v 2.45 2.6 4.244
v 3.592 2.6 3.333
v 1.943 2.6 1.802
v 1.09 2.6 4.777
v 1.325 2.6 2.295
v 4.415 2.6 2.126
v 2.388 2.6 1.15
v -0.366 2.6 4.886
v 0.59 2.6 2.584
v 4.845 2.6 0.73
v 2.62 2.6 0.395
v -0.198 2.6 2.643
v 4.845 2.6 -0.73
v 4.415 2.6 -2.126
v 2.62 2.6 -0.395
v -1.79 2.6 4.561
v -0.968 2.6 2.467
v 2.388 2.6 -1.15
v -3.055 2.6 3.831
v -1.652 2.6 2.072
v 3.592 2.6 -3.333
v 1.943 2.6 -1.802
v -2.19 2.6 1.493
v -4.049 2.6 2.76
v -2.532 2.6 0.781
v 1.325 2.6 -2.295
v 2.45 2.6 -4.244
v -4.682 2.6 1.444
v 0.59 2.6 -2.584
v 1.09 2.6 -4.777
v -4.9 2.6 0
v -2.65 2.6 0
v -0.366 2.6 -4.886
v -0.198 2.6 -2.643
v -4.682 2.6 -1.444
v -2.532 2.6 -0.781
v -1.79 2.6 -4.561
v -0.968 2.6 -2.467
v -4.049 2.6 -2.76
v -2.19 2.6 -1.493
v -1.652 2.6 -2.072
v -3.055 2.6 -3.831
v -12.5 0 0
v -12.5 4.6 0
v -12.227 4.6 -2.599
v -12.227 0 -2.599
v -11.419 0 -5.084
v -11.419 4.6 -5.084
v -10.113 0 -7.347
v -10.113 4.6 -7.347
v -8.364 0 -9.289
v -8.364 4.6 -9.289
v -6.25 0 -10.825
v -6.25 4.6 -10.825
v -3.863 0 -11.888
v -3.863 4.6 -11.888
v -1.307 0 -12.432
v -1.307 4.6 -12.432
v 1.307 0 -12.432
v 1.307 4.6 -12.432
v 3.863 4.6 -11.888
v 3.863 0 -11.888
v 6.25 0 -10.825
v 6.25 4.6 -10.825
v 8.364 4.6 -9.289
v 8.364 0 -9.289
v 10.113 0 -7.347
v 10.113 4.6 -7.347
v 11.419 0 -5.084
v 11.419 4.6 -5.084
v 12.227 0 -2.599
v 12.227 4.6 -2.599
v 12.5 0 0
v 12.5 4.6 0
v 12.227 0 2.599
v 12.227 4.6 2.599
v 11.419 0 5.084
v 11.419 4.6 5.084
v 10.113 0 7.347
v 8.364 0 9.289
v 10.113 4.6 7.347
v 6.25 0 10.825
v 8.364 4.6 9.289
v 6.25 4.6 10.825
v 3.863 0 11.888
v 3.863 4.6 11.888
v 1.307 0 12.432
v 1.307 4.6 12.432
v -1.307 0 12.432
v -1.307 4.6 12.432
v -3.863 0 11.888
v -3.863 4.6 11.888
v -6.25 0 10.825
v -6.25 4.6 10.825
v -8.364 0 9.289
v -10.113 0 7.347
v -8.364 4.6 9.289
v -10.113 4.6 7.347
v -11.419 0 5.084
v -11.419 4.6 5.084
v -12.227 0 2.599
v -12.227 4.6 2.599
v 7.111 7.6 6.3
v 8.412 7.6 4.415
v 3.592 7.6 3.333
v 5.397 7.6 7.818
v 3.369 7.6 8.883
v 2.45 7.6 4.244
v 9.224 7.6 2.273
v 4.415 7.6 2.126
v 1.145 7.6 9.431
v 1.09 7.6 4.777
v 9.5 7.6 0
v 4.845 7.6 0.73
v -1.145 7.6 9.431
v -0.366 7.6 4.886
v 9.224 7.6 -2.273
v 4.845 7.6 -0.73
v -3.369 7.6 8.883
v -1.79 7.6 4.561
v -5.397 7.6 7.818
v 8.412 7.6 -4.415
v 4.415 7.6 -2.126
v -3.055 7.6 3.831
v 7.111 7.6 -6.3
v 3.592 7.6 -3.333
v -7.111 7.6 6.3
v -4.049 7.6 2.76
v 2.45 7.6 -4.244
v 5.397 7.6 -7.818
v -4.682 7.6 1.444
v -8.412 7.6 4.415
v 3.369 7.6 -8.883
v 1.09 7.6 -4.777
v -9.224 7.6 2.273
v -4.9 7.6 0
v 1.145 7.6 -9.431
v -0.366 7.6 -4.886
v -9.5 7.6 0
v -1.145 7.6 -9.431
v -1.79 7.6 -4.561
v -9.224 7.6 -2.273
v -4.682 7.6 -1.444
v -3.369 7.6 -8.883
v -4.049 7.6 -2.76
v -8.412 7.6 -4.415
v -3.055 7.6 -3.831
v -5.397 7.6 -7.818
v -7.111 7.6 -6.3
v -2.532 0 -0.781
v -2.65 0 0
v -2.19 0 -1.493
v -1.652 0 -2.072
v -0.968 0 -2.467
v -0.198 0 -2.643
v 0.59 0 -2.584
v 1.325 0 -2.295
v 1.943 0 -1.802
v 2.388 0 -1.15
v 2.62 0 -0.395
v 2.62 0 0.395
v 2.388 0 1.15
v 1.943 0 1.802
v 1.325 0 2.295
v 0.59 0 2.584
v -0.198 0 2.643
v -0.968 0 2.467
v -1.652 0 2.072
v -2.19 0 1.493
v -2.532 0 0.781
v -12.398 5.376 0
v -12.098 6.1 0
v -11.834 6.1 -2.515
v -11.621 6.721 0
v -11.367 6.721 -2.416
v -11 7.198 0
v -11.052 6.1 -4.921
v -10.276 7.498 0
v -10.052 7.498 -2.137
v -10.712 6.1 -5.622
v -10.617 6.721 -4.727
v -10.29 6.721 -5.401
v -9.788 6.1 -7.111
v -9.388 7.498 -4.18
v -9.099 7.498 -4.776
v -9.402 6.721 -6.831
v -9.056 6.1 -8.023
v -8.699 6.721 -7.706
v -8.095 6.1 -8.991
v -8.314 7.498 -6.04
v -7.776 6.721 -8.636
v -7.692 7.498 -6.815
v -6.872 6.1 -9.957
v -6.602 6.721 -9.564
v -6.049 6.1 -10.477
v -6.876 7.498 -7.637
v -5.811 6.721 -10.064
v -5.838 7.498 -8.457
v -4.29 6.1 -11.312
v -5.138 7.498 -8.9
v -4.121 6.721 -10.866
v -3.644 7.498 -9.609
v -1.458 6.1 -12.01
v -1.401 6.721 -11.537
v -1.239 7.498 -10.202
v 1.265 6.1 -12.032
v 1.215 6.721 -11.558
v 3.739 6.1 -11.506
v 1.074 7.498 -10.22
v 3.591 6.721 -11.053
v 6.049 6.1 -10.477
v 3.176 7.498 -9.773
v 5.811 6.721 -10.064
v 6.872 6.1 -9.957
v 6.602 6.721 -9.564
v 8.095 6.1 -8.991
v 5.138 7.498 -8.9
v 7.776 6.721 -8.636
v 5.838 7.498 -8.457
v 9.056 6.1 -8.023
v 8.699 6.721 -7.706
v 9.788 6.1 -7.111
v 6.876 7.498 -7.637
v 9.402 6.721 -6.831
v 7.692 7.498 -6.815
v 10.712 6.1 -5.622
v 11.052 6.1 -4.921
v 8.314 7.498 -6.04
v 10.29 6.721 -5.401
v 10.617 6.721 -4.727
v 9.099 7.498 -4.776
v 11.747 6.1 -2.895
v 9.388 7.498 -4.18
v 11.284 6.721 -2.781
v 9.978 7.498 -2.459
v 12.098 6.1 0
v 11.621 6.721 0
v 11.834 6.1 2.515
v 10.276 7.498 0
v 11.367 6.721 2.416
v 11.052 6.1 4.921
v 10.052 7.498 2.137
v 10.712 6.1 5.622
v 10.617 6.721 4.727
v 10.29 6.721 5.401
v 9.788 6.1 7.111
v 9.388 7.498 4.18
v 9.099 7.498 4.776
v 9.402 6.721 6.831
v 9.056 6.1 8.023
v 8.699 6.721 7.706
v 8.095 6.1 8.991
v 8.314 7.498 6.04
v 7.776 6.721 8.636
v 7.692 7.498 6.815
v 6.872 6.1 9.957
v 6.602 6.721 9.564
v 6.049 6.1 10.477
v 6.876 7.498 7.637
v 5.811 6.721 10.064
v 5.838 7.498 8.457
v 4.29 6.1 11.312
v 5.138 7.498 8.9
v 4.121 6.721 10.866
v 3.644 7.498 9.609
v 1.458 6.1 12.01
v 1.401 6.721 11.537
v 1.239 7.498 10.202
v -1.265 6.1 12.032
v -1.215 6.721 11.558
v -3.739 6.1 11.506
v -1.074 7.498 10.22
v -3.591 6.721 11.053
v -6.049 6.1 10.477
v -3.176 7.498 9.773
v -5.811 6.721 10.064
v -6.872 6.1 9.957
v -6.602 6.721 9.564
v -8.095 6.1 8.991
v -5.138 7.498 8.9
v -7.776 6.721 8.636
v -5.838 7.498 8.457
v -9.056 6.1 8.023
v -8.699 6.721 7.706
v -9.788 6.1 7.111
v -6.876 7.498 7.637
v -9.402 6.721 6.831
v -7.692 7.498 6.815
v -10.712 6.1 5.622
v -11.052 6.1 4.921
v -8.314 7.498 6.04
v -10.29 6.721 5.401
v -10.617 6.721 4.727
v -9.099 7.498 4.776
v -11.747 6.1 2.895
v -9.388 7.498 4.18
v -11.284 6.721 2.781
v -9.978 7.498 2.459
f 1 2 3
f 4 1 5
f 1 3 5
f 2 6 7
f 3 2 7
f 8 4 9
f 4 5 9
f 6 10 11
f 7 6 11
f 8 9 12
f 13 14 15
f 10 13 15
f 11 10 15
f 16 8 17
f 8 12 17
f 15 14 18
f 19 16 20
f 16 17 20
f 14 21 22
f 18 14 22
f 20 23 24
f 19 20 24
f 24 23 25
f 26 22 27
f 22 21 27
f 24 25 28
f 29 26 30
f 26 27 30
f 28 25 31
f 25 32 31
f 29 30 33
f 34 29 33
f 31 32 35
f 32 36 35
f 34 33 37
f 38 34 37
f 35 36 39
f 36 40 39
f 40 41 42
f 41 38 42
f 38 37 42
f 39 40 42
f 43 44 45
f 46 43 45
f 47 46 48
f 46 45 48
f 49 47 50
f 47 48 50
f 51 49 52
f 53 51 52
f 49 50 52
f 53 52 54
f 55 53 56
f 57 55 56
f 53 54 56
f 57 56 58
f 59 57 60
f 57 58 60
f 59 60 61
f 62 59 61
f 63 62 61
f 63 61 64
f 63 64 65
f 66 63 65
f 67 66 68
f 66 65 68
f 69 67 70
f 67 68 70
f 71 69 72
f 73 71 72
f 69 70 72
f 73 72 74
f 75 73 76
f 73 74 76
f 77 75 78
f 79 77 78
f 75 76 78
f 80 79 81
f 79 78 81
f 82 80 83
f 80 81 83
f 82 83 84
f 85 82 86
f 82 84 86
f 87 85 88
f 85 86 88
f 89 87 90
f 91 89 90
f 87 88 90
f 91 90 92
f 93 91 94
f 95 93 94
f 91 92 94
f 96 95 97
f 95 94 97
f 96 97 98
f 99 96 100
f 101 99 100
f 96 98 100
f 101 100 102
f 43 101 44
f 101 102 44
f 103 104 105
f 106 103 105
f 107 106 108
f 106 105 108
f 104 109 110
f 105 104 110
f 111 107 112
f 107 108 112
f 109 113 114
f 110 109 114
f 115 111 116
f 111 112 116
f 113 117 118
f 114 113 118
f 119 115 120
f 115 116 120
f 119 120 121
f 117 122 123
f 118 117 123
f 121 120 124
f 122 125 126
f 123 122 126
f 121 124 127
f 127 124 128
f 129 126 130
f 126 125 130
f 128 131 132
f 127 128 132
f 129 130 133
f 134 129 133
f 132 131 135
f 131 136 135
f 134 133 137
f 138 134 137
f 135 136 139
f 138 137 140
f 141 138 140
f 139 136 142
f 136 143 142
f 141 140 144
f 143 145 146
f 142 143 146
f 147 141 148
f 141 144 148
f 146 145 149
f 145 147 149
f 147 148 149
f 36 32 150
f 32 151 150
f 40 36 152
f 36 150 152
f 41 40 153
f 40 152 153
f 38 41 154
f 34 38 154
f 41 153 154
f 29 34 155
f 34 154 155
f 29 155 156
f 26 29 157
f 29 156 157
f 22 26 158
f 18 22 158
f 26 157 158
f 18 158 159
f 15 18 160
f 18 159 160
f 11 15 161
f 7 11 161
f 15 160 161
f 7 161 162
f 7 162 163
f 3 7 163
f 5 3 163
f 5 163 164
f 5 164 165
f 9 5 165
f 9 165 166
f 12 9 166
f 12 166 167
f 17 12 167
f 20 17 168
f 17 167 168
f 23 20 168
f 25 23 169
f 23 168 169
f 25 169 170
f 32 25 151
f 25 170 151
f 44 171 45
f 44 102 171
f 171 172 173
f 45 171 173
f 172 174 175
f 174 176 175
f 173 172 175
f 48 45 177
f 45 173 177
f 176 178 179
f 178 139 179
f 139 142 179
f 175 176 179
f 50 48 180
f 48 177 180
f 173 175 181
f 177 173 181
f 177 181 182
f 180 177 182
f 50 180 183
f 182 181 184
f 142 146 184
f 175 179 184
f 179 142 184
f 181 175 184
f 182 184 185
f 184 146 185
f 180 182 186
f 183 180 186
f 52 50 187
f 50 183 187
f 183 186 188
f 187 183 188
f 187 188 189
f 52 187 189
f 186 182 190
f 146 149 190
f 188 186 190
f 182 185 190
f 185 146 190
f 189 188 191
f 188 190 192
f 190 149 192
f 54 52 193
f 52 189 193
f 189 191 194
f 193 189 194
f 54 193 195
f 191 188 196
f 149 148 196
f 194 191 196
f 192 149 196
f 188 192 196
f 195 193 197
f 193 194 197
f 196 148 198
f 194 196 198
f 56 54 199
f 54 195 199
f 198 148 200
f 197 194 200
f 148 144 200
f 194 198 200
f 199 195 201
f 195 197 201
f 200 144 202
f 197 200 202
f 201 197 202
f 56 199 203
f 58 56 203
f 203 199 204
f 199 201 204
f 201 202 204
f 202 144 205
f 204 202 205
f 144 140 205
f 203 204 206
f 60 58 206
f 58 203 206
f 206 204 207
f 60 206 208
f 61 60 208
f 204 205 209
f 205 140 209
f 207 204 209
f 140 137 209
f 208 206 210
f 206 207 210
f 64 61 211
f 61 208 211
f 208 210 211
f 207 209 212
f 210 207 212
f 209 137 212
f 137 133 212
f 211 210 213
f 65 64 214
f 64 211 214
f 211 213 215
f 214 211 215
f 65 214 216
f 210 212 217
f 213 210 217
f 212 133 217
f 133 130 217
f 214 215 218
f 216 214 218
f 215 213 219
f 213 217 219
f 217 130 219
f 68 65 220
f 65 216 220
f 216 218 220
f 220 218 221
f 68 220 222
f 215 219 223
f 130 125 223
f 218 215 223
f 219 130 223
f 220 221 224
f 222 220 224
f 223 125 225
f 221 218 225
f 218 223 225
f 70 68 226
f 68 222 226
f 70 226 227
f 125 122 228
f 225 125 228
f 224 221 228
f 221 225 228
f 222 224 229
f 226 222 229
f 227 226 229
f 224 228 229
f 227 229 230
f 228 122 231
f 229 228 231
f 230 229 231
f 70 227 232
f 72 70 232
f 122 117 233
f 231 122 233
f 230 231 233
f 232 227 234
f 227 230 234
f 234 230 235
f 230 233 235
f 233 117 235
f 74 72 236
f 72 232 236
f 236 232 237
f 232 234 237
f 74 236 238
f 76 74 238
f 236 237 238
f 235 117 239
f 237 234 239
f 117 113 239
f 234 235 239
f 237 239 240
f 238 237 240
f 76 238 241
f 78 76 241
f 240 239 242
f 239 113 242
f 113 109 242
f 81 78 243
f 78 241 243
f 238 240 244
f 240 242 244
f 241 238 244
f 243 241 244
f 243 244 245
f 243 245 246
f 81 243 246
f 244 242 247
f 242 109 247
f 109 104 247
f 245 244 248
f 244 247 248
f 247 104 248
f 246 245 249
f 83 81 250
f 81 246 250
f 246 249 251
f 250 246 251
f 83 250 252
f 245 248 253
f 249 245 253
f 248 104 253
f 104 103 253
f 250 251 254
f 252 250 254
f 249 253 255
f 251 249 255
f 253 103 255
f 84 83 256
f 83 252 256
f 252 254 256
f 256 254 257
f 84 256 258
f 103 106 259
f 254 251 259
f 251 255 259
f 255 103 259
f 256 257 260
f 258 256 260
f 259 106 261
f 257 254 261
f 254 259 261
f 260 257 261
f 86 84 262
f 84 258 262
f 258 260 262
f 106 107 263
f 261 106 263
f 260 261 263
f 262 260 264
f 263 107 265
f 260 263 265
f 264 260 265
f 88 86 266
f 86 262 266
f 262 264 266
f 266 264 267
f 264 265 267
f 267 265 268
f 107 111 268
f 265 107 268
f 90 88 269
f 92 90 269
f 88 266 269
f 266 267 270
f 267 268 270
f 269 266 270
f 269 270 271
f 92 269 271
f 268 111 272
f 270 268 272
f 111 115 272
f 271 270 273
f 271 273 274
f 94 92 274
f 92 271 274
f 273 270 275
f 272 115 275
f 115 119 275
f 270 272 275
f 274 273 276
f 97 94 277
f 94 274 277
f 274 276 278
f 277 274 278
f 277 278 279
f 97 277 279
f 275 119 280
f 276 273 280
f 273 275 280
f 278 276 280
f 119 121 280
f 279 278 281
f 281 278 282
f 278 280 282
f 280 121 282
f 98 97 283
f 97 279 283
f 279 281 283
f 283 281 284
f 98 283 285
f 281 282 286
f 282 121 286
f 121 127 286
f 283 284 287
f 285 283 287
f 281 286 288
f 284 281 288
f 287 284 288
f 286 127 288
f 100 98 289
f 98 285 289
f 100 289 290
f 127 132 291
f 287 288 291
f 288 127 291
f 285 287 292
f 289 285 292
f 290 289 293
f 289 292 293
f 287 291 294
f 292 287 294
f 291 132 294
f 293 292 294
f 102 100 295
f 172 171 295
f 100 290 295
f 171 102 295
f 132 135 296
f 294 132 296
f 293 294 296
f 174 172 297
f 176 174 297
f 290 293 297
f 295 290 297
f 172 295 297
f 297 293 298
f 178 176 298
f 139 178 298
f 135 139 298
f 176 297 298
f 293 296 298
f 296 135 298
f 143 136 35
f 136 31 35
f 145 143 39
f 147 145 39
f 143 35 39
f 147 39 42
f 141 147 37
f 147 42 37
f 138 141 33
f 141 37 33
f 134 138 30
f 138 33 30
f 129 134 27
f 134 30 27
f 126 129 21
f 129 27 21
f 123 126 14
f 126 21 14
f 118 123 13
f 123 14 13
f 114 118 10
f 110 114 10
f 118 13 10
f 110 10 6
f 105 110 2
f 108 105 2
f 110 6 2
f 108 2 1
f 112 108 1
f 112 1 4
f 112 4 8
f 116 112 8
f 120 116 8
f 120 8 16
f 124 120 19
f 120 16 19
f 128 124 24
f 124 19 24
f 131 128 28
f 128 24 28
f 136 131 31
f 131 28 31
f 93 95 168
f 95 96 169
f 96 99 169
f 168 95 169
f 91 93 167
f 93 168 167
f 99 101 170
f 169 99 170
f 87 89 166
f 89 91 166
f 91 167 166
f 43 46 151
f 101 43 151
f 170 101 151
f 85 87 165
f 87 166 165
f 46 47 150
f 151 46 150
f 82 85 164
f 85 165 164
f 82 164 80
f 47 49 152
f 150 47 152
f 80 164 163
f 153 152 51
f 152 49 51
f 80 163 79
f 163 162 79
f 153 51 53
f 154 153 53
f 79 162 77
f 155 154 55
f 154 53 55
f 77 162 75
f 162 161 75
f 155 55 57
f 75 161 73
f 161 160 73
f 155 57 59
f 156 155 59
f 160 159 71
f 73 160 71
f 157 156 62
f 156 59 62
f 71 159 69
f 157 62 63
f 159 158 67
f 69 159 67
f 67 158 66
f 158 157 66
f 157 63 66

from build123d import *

# Parameters (mm, degrees)
CONG_1_R = 3


with BuildPart() as part:
    # Esquisse1 → Révolution1 (revolve)
    with BuildSketch(Plane.XY):
        Polygon((-2.65, 0), (-12.5, 0), (-12.5, 7.6), (-4.9, 7.6), (-4.9, 2.6), (-2.65, 2.6), align=None)
    revolve(axis=Axis((0, 17.675608337, 0), (0, -1, 0)))

    # Congé1
    cong_1_edges = [part.edges().sort_by_distance(p)[0] for p in [
        (12.5, 7.6, 0),
    ]]
    fillet(cong_1_edges, radius=CONG_1_R)


solid = part.part
